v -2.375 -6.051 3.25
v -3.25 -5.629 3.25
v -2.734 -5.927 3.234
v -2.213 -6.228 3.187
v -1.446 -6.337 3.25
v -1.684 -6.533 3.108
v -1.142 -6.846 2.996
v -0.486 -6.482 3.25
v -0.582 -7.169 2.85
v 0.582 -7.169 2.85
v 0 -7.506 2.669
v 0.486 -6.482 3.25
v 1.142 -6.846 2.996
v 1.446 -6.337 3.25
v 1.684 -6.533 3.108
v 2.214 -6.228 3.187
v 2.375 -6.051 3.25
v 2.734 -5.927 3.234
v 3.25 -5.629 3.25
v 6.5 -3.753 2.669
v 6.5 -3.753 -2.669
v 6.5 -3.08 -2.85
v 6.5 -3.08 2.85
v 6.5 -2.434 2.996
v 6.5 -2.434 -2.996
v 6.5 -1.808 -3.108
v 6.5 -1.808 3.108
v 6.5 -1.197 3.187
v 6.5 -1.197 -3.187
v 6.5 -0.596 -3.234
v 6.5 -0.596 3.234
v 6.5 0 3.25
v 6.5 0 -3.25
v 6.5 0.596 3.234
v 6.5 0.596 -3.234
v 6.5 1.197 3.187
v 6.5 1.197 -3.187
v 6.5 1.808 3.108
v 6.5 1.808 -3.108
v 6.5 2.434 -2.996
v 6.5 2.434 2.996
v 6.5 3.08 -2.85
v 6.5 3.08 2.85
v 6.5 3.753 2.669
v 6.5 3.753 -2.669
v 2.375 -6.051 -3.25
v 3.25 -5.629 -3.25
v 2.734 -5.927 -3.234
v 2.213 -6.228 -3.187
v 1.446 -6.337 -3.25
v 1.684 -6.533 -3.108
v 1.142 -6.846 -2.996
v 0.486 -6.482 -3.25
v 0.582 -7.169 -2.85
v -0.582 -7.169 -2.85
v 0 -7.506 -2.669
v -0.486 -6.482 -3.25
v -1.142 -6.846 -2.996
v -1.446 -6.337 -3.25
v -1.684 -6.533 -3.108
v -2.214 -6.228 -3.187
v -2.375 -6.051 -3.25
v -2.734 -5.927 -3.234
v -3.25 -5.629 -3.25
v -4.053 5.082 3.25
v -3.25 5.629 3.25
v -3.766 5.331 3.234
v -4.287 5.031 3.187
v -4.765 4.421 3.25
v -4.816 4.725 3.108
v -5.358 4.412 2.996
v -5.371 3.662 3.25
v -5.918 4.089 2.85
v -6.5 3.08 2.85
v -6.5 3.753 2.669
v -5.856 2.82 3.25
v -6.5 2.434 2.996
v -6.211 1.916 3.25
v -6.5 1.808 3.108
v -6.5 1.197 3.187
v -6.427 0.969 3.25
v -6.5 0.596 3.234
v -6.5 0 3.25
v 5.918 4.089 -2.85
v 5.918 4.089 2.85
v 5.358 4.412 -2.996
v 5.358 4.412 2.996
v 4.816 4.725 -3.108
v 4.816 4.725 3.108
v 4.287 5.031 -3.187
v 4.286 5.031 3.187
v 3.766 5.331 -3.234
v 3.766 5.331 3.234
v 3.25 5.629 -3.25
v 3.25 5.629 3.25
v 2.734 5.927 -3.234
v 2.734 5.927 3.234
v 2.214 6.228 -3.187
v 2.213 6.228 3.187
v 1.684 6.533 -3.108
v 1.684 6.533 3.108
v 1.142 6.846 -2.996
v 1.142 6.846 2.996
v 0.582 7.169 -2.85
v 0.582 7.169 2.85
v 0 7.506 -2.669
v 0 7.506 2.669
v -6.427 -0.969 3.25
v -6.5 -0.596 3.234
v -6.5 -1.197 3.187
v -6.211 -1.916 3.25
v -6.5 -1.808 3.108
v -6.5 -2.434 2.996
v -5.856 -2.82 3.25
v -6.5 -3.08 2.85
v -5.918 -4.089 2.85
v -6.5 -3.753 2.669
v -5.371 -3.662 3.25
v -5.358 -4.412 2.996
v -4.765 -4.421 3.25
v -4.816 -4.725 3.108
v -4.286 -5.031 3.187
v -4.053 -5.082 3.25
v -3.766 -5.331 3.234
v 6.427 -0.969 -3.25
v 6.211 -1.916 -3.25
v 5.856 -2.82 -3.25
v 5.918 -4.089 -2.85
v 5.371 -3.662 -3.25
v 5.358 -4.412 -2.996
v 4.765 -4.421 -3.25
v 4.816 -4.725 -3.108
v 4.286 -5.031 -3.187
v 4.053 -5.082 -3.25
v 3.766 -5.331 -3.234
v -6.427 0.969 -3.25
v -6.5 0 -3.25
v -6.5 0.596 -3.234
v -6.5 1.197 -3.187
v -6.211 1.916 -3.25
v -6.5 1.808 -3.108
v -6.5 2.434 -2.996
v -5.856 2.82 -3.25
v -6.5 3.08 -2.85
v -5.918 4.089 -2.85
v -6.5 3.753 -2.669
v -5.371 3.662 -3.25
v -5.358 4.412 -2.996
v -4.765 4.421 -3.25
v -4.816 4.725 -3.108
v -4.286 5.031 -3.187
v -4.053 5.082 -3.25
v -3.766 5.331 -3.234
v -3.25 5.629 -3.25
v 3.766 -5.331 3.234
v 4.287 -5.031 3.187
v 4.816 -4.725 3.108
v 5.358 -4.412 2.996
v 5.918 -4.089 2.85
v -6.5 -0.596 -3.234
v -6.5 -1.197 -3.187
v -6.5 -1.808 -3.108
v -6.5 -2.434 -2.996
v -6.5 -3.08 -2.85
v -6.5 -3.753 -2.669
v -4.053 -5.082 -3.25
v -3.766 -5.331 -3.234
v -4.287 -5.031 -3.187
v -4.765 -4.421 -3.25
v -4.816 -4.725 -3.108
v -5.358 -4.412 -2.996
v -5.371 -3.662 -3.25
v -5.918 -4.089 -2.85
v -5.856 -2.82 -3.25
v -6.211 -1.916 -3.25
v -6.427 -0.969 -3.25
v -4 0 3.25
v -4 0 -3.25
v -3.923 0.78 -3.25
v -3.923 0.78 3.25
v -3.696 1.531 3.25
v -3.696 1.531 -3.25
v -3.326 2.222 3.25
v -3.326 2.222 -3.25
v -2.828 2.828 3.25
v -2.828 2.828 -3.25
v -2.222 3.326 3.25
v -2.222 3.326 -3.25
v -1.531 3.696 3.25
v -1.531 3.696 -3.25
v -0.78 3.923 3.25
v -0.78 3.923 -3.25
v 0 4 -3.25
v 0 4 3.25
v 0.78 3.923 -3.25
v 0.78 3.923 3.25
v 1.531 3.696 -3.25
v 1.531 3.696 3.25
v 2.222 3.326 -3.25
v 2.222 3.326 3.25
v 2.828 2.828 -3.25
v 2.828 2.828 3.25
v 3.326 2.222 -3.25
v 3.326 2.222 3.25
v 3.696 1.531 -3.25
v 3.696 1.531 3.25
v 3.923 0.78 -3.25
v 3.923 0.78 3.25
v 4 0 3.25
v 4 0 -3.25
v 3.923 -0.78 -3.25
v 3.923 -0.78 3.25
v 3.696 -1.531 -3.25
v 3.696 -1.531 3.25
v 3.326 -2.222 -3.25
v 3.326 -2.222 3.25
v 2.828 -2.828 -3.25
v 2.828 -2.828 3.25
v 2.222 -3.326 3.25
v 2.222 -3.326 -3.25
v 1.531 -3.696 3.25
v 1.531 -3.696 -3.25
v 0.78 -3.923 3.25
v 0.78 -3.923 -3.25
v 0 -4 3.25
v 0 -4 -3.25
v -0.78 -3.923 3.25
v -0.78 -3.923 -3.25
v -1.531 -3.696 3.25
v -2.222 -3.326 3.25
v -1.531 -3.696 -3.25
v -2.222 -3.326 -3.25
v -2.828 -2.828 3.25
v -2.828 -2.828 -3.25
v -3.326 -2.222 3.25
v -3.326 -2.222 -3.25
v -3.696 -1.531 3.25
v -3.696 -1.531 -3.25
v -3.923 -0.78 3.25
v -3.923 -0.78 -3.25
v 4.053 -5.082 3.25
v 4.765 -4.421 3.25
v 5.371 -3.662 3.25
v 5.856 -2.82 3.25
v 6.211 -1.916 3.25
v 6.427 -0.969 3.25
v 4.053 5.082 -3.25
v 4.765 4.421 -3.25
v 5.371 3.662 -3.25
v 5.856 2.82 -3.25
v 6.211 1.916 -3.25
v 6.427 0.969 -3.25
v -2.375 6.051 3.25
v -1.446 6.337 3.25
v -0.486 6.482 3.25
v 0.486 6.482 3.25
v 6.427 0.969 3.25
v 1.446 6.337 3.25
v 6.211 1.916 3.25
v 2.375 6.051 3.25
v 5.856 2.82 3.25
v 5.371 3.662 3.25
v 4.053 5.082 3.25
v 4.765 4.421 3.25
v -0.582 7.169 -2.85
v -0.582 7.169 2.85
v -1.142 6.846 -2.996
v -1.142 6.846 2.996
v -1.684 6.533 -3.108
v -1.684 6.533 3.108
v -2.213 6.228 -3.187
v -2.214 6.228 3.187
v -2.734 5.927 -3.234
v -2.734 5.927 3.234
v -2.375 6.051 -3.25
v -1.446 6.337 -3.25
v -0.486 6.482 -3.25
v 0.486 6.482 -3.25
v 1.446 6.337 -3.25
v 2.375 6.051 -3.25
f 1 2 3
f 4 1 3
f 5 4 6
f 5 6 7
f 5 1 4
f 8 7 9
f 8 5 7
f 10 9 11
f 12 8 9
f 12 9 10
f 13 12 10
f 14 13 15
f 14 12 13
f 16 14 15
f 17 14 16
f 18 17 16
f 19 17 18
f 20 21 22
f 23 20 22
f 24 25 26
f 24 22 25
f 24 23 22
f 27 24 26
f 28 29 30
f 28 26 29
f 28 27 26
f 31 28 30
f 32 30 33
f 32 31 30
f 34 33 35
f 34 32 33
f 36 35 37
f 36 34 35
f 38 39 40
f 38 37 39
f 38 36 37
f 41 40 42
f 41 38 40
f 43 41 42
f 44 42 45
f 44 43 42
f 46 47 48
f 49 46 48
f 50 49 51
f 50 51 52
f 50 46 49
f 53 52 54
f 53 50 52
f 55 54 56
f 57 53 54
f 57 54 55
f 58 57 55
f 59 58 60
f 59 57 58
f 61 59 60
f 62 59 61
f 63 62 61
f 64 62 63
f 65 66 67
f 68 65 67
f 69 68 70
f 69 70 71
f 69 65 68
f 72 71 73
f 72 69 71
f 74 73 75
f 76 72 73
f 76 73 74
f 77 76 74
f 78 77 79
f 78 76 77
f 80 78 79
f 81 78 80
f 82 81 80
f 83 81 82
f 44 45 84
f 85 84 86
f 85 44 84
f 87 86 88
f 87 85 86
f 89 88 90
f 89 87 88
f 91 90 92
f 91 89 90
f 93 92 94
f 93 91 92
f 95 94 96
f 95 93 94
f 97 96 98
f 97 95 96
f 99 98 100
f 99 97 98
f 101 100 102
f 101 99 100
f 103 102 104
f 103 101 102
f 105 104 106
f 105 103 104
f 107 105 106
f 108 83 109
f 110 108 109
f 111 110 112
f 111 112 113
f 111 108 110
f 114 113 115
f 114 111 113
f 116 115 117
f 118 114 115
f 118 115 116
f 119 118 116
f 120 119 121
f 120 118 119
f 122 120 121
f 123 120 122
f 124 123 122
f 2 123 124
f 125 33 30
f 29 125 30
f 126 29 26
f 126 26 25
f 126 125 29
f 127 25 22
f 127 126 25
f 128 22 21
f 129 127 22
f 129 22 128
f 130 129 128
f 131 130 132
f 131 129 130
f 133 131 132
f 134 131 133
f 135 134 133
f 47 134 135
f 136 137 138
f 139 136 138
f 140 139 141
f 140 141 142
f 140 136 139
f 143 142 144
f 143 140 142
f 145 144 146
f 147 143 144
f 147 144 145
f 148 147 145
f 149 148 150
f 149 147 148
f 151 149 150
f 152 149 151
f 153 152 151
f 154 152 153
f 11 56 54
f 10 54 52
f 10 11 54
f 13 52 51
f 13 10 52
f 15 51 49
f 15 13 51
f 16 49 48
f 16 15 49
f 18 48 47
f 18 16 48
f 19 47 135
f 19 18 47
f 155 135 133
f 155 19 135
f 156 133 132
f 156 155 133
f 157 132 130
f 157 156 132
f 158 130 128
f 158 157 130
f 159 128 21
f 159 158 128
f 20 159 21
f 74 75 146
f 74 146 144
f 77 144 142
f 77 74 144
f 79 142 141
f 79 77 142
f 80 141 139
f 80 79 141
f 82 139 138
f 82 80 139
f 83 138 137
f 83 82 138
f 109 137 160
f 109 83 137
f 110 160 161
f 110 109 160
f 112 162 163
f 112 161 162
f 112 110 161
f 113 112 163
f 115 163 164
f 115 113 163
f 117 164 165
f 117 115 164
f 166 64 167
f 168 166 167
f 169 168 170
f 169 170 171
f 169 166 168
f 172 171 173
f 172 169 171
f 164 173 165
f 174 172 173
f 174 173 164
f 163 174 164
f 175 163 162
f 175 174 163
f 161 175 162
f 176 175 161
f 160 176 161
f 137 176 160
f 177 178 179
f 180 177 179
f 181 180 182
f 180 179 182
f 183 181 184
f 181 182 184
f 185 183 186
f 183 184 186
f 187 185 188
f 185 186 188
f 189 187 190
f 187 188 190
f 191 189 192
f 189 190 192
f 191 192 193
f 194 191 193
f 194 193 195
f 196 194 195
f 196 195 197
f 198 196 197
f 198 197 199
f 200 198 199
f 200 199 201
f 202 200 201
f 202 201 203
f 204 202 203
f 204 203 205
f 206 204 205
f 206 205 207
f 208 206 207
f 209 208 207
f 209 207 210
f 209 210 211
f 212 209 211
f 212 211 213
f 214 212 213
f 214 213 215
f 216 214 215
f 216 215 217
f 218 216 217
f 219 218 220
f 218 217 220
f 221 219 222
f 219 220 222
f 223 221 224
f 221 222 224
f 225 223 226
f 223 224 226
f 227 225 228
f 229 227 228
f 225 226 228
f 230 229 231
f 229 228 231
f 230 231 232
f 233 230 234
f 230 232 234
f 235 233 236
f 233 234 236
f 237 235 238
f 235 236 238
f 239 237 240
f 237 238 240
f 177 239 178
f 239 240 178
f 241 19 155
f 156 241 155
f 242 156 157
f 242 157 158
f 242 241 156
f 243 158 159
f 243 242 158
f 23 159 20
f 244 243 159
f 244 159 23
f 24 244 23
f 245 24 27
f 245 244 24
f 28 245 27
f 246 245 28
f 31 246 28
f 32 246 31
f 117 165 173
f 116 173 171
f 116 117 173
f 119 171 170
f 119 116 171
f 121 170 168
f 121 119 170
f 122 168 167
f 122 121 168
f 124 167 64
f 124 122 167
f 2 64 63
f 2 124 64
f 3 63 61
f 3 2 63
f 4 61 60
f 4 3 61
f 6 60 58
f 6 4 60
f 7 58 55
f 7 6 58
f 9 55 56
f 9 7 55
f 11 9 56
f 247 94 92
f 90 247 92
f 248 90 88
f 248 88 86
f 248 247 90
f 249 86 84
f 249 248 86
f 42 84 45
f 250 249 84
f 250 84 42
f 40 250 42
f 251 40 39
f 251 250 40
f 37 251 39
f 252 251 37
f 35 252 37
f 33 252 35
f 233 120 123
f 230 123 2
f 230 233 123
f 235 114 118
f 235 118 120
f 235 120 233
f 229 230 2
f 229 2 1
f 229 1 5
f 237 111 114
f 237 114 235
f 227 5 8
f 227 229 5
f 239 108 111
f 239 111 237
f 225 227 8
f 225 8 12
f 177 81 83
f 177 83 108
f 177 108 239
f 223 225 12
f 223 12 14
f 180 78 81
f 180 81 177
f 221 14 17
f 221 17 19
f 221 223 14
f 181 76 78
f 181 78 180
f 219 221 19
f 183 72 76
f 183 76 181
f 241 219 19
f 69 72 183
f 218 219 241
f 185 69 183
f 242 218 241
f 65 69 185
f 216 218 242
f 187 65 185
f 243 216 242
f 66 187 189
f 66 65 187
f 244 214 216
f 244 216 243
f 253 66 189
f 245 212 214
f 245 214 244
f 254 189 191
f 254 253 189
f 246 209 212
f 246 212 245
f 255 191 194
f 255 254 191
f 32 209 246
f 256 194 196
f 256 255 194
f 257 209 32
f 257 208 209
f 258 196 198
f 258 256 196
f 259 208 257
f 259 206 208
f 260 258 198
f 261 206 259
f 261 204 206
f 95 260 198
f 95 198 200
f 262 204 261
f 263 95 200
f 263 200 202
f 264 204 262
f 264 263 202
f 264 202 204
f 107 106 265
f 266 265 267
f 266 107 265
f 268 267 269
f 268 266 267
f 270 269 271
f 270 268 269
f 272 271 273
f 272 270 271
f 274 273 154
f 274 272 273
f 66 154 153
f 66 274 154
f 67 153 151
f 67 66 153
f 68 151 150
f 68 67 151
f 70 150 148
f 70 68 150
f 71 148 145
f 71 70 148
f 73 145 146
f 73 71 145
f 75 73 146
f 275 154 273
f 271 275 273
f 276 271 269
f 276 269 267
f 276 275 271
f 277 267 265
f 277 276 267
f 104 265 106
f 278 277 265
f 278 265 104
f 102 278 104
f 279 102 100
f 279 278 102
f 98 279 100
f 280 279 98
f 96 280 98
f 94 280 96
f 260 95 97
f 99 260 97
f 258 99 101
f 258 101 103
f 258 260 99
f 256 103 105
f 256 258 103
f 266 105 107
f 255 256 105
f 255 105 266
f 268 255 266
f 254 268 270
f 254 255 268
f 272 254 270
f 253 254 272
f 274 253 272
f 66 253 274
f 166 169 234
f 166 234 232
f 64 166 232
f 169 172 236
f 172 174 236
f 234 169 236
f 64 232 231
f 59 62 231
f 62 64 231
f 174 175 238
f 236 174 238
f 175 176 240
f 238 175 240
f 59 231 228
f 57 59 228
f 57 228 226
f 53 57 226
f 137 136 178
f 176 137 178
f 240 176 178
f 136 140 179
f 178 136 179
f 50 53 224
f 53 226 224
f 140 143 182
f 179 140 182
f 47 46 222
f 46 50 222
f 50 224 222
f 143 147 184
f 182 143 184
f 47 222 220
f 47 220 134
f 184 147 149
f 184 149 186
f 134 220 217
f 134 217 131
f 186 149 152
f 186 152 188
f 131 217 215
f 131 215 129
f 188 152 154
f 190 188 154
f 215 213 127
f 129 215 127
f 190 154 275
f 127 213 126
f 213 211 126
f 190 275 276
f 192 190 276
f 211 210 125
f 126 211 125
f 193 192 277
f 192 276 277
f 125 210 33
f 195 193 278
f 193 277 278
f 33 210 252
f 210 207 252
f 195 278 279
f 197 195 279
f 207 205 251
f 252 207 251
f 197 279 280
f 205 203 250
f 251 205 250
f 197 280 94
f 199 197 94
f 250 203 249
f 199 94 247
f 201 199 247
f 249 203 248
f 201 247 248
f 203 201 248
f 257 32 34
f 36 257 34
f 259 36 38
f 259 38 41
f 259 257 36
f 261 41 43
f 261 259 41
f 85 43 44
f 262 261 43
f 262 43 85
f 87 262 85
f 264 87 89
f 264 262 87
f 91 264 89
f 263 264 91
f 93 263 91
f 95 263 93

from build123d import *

# Parameters (mm, degrees)
EXTRUDE1_DEPTH          = 3.25
SKETCH13_R              = 4
BOSS_EXTRUDE1_DEPTH     = 6.5
SKETCH7_OUTSIDE_W       = 107.168
SKETCH7_OUTSIDE_H       = 109.18
SKETCH7_OUTSIDE_R       = 6.5
EXTRUDE2_DEPTH          = 25.4
EXTRUDE2_DRAFT          = -60
MIRROR2_COPY_1_SKETCH_W = 107.168
MIRROR2_COPY_1_SKETCH_H = 109.18
MIRROR2_COPY_1_SKETCH_R = 6.5
MIRROR2_COPY_1_DEPTH    = 25.4
MIRROR2_COPY_1_DRAFT    = -60


with BuildPart() as part:
    # Sketch1 → Extrude1 (new, symmetric)
    with BuildSketch(Plane.XY):
        Polygon((-6.5, 3.75277675), (-6.5, -3.75277675), (0, -7.505553499), (6.5, -3.75277675), (6.5, 3.75277675), (0, 7.505553499), align=None)
    extrude(amount=EXTRUDE1_DEPTH, both=True)

    # Cut-Extrude2 cone 1 section (through the dimple's axis) → Cut-Extrude2 (revolve, cut)
    with BuildSketch(Plane(origin=(0, 0, 3.25), x_dir=(0, -1, 0), z_dir=(1, 0, 0))):
        Polygon((0, 0), (4, 0), (0, 4), align=None)
    revolve(axis=Axis((0, 0, 3.25), (0, 0, -1)), mode=Mode.SUBTRACT)

    # Cut-Extrude3 cone 1 section (through the dimple's axis) → Cut-Extrude3 (revolve, cut)
    with BuildSketch(Plane(origin=(0, 0, -3.25), x_dir=(0, 1, 0), z_dir=(1, 0, 0))):
        Polygon((0, 0), (4, 0), (0, 4), align=None)
    revolve(axis=Axis((0, 0, -3.25), (0, 0, 1)), mode=Mode.SUBTRACT)


with BuildPart() as body_2:
    # Sketch13 → Boss-Extrude1 (new body)
    with BuildSketch(Plane(origin=(0, 0, -3.25), x_dir=(-1, 0, 0), z_dir=(0, 0, -1))):
        Circle(SKETCH13_R)
    extrude(amount=-BOSS_EXTRUDE1_DEPTH)


with BuildPart() as part_1:
    add(part.part)

    # Combine1: cut body 2
    add(body_2.part, mode=Mode.SUBTRACT)


with BuildPart() as extrude2_tool:
    # Sketch7 outside → Extrude2 (with draft: the straight prism first)
    with BuildSketch(Plane.XY.offset(3.25)):
        Rectangle(SKETCH7_OUTSIDE_W, SKETCH7_OUTSIDE_H)
        Circle(SKETCH7_OUTSIDE_R, mode=Mode.SUBTRACT)
    extrude(amount=-EXTRUDE2_DEPTH)
    # Extrude2: the draft: its side faces are tilted about the plane it starts from
    extrude2_sides = [extrude2_tool.faces().sort_by_distance(p)[0] for p in [
        (0, -54.59, -9.45),
        (53.584, 0, -9.45),
        (0, 54.59, -9.45),
        (-53.584, 0, -9.45),
        (-6.5, 0, -9.45),
    ]]
    draft(extrude2_sides, Plane.XY.offset(3.25), EXTRUDE2_DRAFT)


with BuildPart() as part_2:
    add(part_1.part)

    # Extrude2: cut by extrude2_tool
    add(extrude2_tool.part, mode=Mode.SUBTRACT)


with BuildPart() as mirror2_copy_1_tool:
    # Mirror2 copy 1 sketch → Mirror2 copy 1 (with draft: the straight prism first)
    with BuildSketch(Plane(origin=(0, 0, -3.25), x_dir=(1, 0, 0), z_dir=(0, 0, -1))):
        Rectangle(MIRROR2_COPY_1_SKETCH_W, MIRROR2_COPY_1_SKETCH_H)
        Circle(MIRROR2_COPY_1_SKETCH_R, mode=Mode.SUBTRACT)
    extrude(amount=-MIRROR2_COPY_1_DEPTH)
    # Mirror2 copy 1: the draft: its side faces are tilted about the plane it starts from
    mirror2_copy_1_sides = [mirror2_copy_1_tool.faces().sort_by_distance(p)[0] for p in [
        (0, -54.59, 9.45),
        (53.584, 0, 9.45),
        (0, 54.59, 9.45),
        (-53.584, 0, 9.45),
        (-6.5, 0, 9.45),
    ]]
    draft(mirror2_copy_1_sides, Plane(origin=(0, 0, -3.25), x_dir=(1, 0, 0), z_dir=(0, 0, -1)), MIRROR2_COPY_1_DRAFT)


with BuildPart() as part_3:
    add(part_2.part)

    # Mirror2 copy 1: cut by mirror2_copy_1_tool
    add(mirror2_copy_1_tool.part, mode=Mode.SUBTRACT)


solid = part_3.part
